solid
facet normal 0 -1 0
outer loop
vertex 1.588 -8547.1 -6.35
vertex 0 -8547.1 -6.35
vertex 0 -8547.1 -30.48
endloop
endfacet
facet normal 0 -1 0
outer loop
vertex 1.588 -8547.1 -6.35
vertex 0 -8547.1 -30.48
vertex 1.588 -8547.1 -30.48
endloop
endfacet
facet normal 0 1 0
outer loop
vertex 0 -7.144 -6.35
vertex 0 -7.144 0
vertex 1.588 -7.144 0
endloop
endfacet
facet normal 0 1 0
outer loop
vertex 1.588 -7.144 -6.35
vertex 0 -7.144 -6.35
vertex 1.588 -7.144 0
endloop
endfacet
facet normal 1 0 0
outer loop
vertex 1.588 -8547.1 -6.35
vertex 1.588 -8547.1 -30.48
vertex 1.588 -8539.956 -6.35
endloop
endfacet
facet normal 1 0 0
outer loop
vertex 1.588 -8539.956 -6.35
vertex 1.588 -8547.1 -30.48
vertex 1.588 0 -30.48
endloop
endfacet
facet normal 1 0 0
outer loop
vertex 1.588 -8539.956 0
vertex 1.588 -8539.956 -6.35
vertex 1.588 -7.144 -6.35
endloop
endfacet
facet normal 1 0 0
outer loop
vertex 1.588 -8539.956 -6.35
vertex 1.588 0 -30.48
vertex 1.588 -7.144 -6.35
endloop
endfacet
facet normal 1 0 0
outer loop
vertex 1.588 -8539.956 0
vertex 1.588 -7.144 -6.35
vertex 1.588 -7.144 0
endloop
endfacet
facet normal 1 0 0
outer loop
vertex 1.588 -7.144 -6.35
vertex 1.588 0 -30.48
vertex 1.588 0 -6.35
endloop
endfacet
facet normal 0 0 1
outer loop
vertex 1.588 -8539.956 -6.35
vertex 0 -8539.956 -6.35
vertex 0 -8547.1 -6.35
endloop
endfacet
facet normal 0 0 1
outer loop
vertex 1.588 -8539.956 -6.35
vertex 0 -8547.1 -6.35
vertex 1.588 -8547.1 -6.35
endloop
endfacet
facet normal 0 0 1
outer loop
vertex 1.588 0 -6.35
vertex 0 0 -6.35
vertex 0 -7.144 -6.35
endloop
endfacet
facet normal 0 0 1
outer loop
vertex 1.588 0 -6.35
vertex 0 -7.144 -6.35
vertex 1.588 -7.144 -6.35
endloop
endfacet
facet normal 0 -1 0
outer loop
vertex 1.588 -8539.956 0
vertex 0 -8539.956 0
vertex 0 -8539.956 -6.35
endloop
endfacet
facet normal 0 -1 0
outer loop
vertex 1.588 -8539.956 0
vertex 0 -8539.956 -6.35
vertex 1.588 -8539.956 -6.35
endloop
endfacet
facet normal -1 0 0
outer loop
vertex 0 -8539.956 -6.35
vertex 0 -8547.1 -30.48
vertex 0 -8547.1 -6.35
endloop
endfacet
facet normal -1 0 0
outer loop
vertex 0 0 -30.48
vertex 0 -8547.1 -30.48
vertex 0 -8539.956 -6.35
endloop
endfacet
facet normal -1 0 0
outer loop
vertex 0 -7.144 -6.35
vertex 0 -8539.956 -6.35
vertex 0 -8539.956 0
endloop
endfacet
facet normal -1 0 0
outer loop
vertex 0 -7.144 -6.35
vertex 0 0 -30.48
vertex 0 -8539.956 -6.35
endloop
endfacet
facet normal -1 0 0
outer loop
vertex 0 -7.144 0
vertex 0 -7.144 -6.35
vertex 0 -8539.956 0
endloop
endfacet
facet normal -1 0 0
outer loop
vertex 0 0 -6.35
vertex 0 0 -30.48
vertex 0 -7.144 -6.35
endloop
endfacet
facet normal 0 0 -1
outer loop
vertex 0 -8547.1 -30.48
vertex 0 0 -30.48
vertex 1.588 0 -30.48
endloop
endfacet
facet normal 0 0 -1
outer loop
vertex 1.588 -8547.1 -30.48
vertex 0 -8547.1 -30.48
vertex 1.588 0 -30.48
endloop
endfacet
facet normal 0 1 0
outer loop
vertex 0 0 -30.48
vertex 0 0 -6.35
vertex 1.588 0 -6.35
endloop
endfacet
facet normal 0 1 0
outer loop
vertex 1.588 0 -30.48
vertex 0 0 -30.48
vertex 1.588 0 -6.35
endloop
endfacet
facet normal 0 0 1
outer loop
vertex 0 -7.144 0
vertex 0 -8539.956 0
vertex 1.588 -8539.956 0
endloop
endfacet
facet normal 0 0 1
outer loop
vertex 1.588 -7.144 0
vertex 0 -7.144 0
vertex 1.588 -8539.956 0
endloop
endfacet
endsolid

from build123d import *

# Parameters (mm, degrees)
F0_W     = 1.5875
F0_H     = 30.48
F1_DEPTH = 8547.1
F2_W     = 1.5875
F2_H     = 7.14375
F3_DEPTH = 6.35


with BuildPart() as f1:
    # F0 (on Front) → F1 (new body)
    with BuildSketch(Plane.XZ):
        with Locations((0.79375, -15.24)):
            Rectangle(F0_W, F0_H)
    extrude(amount=F1_DEPTH)

    # F2 (on face) → F3 (cut)
    with BuildSketch(Plane.XY):
        with Locations((0.79375, -8543.528125)):
            Rectangle(F2_W, F2_H)
        with Locations((0.79375, -3.571875)):
            Rectangle(F2_W, F2_H)
    extrude(amount=-F3_DEPTH, mode=Mode.SUBTRACT)


solid = f1.part
